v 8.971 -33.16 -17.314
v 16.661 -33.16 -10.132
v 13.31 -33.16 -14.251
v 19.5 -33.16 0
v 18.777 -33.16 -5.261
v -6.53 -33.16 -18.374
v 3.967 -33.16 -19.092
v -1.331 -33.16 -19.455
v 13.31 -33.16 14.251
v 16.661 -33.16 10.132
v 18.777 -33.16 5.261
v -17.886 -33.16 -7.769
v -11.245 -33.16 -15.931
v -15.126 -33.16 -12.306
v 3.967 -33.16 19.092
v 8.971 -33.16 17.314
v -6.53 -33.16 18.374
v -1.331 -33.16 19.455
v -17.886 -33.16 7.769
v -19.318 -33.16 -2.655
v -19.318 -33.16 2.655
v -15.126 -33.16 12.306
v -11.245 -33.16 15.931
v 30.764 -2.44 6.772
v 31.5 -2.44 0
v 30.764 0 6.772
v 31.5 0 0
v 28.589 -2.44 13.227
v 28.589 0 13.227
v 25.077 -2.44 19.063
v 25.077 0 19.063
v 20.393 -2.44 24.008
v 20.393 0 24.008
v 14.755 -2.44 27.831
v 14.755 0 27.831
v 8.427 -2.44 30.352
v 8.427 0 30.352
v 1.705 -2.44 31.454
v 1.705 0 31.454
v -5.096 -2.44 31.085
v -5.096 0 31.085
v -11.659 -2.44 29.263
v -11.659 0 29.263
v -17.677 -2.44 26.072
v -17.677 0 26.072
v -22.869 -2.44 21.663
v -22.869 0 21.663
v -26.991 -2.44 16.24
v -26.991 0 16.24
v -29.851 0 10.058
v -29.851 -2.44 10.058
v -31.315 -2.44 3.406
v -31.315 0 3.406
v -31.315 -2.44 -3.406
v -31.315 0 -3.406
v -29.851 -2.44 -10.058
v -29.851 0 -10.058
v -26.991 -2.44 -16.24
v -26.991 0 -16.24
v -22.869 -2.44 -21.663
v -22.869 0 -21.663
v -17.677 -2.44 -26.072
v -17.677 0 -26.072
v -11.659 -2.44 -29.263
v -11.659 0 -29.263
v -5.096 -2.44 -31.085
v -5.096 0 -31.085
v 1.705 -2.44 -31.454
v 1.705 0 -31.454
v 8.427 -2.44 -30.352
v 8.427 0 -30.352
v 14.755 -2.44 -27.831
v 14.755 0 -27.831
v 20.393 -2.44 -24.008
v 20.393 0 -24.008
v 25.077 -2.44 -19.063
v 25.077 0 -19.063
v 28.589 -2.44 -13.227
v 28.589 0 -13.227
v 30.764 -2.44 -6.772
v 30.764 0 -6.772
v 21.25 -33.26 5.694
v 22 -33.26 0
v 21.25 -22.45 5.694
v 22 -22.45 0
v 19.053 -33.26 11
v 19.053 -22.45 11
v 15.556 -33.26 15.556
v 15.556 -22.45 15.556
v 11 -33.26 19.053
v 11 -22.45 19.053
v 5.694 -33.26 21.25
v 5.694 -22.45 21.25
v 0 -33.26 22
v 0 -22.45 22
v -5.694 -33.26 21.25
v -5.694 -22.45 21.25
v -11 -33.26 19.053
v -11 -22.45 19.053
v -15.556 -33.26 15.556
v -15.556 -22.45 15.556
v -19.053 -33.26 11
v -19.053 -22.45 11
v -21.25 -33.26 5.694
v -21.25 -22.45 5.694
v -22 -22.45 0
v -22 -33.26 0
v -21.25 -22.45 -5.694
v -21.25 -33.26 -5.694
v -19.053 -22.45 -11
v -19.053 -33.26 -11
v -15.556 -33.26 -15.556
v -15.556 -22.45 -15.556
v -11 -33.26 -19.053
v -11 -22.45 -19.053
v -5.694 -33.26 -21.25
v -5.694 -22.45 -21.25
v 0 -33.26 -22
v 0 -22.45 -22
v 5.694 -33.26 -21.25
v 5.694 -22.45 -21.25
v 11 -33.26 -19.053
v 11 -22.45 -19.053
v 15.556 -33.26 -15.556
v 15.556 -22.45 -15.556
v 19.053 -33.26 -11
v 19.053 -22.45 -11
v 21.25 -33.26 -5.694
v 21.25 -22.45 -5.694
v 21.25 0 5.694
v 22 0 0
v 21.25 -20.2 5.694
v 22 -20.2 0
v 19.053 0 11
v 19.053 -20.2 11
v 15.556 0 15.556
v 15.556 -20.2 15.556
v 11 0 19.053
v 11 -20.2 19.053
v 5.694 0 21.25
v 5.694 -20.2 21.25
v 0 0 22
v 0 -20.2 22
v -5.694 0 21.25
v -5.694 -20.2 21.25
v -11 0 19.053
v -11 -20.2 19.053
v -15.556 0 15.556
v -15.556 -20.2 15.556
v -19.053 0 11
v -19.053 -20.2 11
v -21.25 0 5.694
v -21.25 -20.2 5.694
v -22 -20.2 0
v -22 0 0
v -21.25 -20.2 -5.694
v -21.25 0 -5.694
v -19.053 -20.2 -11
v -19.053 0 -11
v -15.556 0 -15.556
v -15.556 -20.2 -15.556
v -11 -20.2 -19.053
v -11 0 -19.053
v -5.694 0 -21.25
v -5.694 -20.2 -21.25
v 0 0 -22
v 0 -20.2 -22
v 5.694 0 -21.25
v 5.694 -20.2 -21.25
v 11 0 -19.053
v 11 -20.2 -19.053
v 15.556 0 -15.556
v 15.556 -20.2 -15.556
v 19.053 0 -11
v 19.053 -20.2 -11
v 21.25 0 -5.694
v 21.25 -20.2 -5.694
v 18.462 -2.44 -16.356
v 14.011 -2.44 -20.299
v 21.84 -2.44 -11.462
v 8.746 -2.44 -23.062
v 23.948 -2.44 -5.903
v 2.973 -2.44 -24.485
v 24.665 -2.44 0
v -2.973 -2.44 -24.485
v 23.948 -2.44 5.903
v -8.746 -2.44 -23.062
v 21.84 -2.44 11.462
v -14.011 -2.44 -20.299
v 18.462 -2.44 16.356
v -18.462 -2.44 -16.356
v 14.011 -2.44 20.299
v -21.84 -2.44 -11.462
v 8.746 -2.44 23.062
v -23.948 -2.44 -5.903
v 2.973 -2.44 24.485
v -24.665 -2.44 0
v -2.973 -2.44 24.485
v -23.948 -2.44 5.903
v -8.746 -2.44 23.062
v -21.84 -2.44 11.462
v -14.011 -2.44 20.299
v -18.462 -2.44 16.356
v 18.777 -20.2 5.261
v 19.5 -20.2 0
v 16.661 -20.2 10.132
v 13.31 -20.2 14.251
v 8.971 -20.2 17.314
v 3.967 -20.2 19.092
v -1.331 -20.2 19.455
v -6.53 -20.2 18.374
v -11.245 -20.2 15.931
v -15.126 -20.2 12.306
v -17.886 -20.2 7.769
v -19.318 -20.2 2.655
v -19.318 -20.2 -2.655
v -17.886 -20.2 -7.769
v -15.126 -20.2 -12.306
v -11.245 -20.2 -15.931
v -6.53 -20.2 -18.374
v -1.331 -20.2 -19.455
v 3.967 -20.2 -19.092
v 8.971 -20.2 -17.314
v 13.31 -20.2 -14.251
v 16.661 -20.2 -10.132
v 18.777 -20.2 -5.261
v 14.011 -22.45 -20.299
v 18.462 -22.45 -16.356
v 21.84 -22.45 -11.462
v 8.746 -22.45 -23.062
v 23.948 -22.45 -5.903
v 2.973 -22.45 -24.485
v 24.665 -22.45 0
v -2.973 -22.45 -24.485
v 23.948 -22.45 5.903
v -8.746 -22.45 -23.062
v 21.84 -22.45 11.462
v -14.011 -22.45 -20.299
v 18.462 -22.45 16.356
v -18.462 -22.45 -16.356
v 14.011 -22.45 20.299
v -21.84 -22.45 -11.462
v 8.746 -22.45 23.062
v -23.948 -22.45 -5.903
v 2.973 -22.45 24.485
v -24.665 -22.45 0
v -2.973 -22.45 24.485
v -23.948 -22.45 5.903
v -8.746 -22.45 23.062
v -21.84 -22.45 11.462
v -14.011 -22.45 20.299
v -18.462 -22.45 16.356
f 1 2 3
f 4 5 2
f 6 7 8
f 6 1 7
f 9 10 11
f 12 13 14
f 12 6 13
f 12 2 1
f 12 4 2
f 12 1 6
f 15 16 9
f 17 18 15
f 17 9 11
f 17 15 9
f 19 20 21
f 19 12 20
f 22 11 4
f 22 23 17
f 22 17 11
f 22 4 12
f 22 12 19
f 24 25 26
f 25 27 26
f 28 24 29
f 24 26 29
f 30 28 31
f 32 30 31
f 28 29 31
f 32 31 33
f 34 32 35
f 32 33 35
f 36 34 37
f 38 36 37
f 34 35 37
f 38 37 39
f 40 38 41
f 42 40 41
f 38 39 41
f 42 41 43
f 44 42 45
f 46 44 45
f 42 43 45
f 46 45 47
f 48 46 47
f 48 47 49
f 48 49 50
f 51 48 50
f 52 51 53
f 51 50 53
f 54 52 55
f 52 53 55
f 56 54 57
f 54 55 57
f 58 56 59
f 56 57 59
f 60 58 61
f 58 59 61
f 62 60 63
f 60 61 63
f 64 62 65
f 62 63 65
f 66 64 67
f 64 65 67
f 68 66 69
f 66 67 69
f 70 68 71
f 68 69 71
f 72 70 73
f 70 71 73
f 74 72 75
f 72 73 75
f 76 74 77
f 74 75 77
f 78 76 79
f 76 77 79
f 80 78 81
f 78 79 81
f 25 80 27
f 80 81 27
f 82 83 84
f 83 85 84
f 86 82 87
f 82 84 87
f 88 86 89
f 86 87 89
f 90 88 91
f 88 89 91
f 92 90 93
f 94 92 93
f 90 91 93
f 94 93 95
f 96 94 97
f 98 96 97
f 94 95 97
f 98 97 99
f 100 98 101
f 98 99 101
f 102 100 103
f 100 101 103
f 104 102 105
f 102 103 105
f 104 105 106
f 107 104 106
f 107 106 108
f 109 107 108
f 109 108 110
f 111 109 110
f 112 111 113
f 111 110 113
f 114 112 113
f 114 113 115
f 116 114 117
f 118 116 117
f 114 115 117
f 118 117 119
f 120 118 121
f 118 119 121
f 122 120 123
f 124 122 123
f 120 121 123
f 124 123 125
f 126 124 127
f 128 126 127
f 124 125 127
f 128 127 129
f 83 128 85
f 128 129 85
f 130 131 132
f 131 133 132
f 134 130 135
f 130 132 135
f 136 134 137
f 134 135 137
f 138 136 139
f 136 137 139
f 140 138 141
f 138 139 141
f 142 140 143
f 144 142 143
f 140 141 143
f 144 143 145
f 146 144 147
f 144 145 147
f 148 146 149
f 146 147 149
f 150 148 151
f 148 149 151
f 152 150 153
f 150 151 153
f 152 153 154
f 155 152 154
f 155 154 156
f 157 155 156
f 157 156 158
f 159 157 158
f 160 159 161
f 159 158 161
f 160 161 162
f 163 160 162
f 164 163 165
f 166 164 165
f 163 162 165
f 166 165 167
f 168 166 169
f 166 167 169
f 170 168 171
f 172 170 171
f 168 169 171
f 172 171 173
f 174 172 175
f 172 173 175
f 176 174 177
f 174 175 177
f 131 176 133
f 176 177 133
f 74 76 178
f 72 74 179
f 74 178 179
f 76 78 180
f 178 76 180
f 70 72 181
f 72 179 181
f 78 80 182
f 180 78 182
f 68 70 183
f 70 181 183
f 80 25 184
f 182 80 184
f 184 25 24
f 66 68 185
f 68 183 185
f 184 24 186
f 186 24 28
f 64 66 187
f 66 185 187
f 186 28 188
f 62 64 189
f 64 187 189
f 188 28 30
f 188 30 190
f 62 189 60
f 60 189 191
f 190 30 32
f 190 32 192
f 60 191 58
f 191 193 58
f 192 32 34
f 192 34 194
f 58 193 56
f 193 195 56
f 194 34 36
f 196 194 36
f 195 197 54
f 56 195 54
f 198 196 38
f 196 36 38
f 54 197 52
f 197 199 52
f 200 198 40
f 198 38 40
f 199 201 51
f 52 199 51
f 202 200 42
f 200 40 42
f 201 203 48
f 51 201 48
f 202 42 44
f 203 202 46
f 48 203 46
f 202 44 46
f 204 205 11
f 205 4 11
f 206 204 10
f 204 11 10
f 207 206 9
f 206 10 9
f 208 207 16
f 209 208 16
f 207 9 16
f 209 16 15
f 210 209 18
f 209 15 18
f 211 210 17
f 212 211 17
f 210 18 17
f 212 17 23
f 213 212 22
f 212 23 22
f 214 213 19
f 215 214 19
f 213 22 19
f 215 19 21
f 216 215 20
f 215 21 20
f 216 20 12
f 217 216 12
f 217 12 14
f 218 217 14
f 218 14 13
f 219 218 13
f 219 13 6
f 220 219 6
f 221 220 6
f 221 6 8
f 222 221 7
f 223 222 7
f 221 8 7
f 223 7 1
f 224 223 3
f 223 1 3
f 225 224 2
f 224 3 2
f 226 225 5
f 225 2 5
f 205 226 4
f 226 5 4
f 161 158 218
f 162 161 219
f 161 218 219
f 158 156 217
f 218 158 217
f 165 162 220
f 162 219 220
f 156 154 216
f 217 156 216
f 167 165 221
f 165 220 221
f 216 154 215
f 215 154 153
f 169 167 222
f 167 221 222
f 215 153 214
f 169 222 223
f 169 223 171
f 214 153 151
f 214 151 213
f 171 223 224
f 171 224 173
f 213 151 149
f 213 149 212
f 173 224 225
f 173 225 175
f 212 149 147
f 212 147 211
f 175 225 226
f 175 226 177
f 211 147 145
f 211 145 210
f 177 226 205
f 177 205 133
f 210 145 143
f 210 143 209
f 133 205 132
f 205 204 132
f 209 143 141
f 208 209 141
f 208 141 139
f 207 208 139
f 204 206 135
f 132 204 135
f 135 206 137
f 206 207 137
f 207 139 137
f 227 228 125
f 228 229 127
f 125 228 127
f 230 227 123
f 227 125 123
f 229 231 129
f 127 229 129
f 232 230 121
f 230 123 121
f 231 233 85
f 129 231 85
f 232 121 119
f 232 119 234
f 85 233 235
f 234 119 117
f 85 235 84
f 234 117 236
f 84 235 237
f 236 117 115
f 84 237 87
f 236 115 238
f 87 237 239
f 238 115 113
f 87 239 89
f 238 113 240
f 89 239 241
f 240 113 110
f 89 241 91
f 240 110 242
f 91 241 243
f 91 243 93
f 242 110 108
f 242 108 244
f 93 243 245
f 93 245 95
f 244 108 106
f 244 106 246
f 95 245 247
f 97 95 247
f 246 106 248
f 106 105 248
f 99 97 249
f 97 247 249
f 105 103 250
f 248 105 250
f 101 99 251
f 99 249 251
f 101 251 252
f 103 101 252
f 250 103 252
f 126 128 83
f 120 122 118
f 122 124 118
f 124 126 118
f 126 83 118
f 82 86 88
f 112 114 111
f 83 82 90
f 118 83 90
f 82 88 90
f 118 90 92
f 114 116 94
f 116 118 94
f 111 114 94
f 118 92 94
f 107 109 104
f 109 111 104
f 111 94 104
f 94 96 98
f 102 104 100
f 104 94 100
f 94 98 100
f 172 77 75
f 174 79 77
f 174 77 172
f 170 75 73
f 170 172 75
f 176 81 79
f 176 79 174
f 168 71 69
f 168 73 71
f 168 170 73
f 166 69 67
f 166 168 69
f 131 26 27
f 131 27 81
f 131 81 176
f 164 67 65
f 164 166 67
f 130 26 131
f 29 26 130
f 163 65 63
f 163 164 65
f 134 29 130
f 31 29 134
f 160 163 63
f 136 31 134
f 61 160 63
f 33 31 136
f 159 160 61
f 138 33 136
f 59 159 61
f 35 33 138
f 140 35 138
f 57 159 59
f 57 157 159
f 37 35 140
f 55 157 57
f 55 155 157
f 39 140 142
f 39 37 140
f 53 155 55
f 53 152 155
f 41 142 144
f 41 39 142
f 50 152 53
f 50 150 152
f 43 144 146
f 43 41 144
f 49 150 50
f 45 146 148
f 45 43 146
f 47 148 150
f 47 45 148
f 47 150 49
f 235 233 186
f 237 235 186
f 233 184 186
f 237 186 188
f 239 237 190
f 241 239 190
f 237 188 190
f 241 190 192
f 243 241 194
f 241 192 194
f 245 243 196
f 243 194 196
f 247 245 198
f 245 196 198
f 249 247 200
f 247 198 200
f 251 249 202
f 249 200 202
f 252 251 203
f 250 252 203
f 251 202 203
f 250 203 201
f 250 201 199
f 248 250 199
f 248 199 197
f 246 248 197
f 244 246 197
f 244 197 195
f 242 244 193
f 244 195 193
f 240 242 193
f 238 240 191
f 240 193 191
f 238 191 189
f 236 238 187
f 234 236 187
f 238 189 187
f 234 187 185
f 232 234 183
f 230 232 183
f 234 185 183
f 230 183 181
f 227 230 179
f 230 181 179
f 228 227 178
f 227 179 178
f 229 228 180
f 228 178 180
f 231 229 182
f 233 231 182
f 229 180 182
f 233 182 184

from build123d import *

# Parameters (mm, degrees)
SKETCH_2_W   = 9.5
SKETCH_2_H   = 2.44
SKETCH_2_W_2 = 19.5
SKETCH_2_H_2 = 0.1


with BuildPart() as part:
    # 草图2 → 旋转1 (revolve)
    with BuildSketch(Plane.XY):
        with Locations((26.75, -1.22)):
            Rectangle(SKETCH_2_W, SKETCH_2_H)
        Polygon((24.665, -2.44), (22, -2.44), (22, -20.2), (22, -22.45), (24.665, -22.45), align=None)
        Polygon((22, -22.45), (22, -20.2), (19.5, -20.2), (19.5, -33.16), (19.5, -33.26), (22, -33.26), align=None)
        with Locations((9.75, -33.21)):
            Rectangle(SKETCH_2_W_2, SKETCH_2_H_2)
    revolve(axis=Axis((0, 6.935540238, 0), (0, -1, 0)))


solid = part.part
